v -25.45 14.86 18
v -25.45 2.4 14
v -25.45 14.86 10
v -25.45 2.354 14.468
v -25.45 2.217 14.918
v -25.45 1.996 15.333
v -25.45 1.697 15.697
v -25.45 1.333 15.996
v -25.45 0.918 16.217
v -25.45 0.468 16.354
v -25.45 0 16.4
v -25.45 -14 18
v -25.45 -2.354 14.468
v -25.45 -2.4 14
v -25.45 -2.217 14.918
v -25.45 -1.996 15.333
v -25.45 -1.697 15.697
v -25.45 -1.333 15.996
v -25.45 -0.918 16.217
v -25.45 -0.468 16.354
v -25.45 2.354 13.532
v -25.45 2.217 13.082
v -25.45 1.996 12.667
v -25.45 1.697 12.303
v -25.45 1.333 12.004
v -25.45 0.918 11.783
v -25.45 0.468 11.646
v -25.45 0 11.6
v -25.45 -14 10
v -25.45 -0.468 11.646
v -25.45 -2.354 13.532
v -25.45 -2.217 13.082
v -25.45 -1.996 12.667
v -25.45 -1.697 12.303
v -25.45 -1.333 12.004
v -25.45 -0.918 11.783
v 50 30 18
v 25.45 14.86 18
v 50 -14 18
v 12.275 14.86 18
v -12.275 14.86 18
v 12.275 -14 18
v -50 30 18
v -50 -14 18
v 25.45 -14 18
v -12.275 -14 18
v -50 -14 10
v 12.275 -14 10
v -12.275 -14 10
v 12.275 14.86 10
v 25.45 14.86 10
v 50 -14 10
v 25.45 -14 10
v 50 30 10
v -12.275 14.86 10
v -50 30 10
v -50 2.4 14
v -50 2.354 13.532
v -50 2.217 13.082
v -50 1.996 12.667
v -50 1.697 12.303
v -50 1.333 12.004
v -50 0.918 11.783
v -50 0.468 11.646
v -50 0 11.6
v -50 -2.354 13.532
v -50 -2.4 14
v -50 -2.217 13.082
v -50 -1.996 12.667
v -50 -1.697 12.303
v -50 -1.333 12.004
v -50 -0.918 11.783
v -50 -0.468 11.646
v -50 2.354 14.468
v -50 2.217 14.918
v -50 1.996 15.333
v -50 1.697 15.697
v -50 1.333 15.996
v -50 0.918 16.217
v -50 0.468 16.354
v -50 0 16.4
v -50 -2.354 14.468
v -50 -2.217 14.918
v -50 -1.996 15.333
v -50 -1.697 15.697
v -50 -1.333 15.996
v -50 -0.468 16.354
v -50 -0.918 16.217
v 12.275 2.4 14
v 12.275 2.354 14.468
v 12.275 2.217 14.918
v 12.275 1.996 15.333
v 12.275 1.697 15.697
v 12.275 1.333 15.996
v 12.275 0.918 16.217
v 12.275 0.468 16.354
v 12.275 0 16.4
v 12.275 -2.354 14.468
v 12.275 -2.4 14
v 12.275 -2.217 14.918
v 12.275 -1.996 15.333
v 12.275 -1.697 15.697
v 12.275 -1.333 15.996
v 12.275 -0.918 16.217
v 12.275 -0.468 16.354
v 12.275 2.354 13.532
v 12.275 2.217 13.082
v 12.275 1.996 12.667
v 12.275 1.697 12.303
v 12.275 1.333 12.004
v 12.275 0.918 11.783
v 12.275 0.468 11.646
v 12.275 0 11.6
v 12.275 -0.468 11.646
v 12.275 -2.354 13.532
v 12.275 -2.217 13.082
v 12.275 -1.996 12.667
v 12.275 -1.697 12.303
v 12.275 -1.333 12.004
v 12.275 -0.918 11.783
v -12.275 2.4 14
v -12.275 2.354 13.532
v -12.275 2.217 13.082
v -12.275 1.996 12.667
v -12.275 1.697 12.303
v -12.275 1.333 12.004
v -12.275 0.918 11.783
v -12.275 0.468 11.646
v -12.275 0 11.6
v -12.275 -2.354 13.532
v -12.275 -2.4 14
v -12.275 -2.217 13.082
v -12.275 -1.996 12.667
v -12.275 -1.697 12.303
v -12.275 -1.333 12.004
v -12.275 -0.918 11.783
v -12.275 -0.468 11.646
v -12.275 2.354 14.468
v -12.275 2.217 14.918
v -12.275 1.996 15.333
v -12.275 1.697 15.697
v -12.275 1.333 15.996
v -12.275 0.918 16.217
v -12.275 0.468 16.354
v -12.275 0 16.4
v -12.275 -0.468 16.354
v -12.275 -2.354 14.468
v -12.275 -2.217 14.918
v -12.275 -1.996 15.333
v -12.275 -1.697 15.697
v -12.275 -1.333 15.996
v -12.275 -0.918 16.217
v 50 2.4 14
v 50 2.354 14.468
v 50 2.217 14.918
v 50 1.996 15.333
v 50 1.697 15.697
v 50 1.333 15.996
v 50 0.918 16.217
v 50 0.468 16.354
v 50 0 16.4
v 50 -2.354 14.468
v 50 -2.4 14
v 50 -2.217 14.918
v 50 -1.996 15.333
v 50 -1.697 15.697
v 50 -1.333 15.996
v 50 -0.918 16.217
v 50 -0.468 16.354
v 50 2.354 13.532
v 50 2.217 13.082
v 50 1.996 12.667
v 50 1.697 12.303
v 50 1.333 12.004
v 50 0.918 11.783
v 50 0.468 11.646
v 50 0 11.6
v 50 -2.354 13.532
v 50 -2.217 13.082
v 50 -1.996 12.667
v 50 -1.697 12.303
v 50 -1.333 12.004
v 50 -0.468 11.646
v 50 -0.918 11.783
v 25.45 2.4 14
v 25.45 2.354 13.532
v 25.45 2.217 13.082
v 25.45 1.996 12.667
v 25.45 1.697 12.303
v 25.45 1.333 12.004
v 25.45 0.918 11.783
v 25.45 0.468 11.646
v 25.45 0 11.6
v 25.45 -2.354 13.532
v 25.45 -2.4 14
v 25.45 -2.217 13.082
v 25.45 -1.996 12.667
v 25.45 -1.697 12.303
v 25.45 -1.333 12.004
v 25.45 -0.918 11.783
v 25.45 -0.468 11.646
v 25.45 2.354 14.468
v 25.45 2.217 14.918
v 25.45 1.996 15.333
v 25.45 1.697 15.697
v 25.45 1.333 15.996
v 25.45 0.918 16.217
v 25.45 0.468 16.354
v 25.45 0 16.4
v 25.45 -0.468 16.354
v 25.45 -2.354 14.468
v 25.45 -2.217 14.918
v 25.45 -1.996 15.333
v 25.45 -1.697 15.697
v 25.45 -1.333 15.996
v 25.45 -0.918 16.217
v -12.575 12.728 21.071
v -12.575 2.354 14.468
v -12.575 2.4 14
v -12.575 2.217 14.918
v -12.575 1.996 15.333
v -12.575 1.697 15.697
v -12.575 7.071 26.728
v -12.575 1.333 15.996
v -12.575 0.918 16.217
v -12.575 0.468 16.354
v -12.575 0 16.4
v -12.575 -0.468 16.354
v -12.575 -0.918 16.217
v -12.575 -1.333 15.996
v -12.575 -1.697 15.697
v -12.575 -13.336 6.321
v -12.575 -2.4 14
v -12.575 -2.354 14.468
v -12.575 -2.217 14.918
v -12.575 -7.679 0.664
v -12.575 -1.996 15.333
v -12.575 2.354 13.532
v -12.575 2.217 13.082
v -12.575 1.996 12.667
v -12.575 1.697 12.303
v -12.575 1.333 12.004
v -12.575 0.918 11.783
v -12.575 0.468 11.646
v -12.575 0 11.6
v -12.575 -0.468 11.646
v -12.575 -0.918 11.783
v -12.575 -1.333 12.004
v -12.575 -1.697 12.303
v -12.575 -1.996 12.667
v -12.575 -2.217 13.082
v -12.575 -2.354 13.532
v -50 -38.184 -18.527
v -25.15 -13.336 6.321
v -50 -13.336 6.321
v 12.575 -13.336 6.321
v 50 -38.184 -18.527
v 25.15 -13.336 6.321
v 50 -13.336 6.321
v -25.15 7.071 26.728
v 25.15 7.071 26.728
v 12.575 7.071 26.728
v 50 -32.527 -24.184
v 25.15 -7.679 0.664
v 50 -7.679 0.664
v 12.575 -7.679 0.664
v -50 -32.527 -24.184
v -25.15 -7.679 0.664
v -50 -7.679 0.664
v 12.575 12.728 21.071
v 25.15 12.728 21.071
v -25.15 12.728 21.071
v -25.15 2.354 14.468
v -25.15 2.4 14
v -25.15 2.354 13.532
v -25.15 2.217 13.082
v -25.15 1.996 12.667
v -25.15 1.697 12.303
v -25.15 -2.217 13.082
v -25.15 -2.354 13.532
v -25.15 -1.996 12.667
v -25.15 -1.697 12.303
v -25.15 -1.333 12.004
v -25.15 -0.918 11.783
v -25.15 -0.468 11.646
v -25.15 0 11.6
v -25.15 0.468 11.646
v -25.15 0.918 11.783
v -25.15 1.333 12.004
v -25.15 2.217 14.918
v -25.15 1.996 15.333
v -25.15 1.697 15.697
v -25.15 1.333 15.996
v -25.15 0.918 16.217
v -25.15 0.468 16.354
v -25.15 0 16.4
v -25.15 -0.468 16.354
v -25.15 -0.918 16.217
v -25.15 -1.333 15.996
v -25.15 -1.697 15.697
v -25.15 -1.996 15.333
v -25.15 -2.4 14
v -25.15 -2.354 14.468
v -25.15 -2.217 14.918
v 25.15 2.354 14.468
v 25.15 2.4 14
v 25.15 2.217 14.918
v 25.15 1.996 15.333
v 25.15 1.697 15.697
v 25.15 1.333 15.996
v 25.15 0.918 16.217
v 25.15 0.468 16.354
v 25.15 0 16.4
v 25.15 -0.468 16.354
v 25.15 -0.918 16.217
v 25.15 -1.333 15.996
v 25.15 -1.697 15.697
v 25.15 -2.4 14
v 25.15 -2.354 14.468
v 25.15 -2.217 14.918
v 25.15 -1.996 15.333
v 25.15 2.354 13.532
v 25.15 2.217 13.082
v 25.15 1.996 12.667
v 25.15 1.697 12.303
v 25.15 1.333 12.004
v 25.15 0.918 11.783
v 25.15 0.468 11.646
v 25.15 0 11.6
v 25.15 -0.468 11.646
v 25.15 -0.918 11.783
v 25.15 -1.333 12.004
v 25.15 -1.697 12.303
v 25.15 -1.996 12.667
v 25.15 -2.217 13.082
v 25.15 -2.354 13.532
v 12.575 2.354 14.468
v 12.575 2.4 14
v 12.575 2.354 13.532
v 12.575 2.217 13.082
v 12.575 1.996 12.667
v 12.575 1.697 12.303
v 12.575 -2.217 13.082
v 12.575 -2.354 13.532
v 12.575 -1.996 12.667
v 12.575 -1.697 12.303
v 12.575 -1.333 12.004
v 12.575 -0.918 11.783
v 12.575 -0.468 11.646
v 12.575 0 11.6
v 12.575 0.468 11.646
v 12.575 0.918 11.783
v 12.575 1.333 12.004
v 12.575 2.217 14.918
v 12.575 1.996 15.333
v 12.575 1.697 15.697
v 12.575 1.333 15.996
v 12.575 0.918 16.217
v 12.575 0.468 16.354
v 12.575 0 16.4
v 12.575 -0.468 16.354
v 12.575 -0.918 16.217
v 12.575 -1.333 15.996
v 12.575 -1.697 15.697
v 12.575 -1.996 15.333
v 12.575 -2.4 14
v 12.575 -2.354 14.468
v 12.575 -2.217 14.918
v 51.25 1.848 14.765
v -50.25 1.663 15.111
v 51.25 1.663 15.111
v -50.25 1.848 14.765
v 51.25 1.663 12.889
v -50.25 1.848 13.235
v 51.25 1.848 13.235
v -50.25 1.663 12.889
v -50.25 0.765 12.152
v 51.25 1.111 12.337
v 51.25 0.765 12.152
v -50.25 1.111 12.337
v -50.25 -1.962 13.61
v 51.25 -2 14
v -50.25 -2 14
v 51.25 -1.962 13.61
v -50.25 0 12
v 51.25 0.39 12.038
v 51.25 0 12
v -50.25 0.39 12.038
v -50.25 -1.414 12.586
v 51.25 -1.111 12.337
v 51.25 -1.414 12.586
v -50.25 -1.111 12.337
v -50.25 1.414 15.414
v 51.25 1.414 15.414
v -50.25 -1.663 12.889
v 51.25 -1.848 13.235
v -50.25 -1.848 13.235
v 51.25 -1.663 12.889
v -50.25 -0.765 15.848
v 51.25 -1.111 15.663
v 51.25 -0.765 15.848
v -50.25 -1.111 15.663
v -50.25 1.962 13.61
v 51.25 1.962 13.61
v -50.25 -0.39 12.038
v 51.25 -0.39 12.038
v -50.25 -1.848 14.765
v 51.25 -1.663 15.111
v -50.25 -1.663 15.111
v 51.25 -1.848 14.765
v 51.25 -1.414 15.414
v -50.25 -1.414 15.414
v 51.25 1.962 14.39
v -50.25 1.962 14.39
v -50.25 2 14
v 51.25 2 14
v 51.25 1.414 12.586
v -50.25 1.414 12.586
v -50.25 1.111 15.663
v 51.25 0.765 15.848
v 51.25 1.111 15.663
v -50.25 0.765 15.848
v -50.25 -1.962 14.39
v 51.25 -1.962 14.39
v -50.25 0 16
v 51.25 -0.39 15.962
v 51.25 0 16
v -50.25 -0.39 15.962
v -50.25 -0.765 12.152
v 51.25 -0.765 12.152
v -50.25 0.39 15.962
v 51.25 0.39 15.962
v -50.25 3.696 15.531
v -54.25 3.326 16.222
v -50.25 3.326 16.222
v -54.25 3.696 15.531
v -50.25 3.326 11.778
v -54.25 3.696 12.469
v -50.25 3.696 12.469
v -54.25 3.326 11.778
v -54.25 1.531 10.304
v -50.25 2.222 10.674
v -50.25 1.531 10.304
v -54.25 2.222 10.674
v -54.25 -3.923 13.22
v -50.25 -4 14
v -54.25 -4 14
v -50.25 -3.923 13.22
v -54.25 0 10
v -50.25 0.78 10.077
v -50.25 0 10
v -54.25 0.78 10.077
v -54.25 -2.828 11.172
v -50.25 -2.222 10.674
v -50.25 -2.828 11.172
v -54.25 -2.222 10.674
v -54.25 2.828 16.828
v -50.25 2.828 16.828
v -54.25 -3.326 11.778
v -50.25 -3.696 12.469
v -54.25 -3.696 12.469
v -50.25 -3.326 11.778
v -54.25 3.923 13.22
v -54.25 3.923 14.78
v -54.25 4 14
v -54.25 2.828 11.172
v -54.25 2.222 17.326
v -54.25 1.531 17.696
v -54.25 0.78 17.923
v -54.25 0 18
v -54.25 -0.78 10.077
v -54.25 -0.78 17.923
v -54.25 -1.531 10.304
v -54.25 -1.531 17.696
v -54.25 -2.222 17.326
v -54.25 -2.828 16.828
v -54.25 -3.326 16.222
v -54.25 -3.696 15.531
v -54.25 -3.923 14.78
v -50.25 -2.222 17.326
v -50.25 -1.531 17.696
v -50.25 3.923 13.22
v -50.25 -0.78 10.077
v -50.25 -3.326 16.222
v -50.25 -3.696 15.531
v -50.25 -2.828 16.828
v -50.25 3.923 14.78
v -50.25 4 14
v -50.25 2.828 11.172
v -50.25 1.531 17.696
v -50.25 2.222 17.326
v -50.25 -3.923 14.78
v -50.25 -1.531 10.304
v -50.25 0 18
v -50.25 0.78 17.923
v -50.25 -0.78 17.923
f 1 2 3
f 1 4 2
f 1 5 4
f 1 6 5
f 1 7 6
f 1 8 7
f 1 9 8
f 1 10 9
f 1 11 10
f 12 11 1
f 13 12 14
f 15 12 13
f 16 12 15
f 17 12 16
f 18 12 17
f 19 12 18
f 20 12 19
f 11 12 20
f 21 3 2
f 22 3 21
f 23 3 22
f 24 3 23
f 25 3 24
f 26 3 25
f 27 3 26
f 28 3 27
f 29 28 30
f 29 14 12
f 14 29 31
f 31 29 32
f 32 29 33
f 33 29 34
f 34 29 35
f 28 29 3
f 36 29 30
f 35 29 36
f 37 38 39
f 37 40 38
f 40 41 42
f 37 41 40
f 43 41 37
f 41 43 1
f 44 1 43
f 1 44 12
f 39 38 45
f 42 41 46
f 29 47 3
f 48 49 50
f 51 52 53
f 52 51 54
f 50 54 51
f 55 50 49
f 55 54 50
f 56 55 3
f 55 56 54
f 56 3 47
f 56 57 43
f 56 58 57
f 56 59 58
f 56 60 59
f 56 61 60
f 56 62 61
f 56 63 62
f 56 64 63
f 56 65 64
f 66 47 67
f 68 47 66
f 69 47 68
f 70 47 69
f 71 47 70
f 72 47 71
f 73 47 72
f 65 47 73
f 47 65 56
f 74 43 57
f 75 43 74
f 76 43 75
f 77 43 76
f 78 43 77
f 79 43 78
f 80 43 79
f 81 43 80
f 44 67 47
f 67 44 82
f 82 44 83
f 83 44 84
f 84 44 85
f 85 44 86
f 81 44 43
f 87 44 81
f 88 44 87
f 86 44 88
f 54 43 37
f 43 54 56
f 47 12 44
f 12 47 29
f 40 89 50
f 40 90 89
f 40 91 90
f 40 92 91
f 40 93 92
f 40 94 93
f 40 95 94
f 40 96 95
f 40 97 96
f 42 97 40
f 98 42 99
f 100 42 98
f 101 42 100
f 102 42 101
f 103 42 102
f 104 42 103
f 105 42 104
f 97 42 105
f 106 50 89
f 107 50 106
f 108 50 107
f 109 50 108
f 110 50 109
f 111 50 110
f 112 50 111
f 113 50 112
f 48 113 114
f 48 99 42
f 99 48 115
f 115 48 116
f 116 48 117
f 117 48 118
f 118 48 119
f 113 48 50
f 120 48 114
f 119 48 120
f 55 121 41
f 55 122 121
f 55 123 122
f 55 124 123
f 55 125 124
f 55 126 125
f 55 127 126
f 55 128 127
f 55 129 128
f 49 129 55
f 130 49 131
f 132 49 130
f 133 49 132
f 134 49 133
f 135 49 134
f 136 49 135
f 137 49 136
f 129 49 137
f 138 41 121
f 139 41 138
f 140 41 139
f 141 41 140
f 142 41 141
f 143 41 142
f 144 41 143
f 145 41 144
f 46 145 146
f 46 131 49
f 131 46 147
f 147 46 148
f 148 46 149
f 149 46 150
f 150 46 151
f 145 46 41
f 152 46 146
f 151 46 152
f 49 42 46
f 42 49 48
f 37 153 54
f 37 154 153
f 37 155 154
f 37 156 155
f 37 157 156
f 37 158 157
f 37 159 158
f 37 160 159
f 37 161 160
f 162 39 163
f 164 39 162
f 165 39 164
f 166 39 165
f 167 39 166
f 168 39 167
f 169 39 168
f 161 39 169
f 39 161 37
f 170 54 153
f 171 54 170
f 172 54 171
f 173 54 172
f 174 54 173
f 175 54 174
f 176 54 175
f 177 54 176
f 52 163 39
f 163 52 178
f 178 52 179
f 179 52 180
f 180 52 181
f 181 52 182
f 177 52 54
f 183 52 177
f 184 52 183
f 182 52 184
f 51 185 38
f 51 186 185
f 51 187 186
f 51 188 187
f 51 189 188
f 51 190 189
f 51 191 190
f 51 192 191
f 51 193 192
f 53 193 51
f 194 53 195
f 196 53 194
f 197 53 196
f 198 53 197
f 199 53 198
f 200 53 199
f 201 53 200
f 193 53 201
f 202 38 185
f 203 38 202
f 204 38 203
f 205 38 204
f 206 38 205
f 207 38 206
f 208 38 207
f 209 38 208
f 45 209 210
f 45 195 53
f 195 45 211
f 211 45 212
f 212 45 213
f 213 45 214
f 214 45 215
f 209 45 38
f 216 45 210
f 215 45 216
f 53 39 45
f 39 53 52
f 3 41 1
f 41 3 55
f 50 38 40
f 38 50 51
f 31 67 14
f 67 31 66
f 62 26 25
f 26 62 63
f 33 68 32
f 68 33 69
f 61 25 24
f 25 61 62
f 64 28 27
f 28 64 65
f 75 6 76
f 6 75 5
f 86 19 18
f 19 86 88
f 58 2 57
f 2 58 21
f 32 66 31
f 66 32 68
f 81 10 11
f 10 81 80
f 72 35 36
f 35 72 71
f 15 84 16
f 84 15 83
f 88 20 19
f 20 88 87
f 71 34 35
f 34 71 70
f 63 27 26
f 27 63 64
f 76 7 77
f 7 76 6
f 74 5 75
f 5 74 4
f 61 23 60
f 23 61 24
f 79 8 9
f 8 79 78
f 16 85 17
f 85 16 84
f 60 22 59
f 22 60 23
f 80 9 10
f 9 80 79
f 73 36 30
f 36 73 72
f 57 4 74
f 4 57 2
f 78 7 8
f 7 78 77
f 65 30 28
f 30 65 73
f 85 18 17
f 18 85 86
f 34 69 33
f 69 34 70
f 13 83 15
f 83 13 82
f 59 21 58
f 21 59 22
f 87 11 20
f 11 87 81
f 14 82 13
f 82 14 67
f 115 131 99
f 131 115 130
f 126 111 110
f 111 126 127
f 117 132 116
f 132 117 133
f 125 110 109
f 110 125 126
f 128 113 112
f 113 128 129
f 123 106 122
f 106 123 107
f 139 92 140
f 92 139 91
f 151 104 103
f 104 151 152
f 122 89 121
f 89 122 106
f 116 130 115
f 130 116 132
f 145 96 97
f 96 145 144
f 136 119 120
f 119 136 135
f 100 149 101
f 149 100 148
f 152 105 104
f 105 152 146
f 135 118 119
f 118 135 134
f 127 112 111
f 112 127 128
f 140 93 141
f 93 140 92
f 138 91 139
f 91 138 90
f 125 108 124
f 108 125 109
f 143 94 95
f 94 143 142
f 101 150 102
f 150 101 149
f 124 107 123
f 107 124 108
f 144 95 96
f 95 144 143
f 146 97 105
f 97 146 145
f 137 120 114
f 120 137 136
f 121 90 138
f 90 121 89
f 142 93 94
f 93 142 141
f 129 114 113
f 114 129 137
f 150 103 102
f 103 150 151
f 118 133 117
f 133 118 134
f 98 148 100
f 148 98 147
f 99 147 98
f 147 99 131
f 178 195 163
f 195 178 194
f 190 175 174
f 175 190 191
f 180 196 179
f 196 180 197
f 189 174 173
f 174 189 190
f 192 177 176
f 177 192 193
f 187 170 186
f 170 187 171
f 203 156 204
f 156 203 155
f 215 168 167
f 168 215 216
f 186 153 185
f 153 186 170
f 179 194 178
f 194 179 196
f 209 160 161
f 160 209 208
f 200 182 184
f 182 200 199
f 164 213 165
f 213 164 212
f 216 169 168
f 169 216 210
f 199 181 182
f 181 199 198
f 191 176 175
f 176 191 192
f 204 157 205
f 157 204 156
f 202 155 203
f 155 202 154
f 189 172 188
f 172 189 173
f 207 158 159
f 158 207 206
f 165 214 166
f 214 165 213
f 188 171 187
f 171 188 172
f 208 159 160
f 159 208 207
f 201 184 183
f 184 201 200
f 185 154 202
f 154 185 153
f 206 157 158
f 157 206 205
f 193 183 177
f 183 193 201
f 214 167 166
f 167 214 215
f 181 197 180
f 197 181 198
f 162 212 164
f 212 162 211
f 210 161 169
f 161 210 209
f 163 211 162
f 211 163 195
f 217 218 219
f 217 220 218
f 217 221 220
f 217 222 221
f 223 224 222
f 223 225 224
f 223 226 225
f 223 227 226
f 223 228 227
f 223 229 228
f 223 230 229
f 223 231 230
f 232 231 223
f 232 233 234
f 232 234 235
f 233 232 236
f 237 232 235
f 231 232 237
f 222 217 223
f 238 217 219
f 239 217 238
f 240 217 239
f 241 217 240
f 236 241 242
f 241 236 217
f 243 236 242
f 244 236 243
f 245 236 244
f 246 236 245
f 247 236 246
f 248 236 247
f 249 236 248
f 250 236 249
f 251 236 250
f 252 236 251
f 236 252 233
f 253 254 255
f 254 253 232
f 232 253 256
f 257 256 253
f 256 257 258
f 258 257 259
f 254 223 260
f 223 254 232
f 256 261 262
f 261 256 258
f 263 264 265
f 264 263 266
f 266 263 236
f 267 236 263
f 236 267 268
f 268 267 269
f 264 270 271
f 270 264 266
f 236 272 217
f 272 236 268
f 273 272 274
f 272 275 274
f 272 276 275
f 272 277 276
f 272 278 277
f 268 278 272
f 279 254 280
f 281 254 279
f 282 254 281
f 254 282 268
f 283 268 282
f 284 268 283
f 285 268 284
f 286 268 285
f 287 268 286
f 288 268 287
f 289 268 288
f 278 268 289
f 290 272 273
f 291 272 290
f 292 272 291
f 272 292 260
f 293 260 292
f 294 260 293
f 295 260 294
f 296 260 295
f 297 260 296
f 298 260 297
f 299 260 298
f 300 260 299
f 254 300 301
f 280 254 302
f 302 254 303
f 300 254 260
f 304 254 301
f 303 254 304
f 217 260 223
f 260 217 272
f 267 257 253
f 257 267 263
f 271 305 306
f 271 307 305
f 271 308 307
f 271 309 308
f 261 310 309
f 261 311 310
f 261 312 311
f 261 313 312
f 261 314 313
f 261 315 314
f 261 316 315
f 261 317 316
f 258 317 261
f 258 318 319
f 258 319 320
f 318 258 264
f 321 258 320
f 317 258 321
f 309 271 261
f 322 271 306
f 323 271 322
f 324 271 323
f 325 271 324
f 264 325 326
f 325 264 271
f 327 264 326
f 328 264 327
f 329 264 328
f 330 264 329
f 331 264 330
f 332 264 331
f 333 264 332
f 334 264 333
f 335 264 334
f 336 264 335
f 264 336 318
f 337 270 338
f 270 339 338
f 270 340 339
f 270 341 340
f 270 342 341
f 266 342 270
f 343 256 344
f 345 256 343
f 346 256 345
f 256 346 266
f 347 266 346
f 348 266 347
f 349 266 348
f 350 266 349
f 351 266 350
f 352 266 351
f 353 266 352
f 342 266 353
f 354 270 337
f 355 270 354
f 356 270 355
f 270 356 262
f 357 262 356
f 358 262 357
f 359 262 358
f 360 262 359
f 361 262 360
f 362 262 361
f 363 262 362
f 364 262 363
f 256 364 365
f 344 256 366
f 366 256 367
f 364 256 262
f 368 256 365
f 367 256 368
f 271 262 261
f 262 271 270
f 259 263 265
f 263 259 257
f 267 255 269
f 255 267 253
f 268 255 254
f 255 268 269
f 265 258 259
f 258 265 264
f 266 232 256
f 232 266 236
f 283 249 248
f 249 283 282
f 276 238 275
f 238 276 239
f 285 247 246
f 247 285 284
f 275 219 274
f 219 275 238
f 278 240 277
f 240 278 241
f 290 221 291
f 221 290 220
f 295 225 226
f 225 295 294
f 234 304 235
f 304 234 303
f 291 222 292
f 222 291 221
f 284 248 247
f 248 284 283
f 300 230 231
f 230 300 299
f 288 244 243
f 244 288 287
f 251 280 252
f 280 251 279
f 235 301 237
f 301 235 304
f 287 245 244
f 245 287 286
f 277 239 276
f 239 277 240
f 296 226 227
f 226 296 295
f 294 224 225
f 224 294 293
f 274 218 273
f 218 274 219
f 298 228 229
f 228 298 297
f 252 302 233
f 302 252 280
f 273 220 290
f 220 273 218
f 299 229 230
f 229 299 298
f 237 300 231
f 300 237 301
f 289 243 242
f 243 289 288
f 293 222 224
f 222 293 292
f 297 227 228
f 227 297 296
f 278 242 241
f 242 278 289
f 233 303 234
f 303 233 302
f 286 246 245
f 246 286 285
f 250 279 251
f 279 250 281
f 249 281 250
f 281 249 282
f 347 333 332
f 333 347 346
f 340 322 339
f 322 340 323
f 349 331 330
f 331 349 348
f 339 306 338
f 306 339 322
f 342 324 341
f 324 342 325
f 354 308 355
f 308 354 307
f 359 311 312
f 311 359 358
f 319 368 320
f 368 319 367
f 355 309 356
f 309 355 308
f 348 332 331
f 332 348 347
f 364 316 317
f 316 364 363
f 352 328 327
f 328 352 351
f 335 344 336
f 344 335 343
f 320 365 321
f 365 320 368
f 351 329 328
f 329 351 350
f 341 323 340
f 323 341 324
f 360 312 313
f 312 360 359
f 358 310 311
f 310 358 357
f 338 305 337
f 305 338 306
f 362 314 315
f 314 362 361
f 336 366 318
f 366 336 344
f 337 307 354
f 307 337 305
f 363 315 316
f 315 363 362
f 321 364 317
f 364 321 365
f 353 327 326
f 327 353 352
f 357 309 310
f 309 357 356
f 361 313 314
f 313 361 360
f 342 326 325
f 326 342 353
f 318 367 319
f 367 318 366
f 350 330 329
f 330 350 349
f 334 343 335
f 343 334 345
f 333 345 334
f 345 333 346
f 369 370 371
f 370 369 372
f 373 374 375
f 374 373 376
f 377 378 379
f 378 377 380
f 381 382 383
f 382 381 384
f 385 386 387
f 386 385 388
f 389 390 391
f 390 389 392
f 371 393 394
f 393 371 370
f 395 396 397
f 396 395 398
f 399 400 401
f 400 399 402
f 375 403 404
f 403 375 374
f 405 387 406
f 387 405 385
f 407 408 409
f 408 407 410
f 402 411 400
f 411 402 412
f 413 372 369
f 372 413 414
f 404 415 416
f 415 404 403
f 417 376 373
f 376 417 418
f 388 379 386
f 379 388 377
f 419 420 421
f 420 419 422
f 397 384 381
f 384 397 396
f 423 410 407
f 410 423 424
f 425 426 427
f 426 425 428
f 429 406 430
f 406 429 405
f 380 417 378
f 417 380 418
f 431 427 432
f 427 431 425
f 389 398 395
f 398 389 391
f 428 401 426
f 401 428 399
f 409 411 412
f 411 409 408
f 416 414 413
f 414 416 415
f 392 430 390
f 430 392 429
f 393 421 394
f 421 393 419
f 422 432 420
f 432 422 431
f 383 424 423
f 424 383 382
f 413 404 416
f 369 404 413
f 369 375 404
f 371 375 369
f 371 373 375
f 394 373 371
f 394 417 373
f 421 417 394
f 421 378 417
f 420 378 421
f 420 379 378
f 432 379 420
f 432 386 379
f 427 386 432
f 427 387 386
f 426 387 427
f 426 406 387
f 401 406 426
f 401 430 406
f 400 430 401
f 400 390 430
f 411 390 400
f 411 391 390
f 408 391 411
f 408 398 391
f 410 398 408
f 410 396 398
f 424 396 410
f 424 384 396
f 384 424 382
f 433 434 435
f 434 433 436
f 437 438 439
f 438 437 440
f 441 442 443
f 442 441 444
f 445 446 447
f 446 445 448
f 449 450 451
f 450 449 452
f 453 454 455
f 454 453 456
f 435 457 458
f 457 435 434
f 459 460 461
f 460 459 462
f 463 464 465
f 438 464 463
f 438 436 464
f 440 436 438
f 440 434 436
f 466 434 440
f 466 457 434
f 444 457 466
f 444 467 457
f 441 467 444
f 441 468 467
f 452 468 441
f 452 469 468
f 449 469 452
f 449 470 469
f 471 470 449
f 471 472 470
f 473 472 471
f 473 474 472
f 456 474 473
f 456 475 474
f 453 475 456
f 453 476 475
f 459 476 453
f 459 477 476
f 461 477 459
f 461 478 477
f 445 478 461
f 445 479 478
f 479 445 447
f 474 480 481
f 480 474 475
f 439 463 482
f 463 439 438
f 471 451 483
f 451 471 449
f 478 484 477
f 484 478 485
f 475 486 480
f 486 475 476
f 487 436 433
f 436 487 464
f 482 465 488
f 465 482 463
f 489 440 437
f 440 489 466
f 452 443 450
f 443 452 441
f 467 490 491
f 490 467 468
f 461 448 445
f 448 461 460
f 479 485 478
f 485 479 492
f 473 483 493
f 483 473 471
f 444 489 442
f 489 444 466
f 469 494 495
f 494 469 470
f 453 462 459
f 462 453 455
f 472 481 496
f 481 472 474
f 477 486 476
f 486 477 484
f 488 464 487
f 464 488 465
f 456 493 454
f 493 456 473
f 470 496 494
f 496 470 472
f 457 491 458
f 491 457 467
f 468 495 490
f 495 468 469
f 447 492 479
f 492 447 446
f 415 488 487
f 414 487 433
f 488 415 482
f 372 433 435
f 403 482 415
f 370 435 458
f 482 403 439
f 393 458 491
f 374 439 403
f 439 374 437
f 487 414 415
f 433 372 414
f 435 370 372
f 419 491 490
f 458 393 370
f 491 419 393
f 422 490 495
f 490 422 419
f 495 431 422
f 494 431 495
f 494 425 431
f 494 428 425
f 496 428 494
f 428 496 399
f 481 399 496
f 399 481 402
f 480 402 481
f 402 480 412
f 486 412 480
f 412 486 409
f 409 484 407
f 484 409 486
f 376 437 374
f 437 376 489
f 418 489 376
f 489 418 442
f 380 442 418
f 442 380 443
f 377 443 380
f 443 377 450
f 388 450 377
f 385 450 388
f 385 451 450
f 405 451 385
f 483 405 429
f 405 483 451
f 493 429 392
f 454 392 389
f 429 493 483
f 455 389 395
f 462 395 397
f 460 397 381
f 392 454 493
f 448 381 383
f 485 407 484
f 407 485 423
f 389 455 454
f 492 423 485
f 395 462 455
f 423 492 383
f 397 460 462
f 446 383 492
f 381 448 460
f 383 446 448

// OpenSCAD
$fn = 32;

// ------------------------------------------------------------------------
// Butt hinge: hinge 100 mm, leaf swung 45 deg
// Every part is its own module, assembly() places every instance.
// ------------------------------------------------------------------------

// --- part 1 ---
module hinge_base() {
  difference() {
    union() {
      translate([-50, -14, -4]) cube([24.55, 44, 8]);
      translate([-12.275, -14, -4]) cube([24.55, 44, 8]);
      translate([25.45, -14, -4]) cube([24.55, 44, 8]);
      translate([-50, 14.86, -4]) cube([100, 15.14, 8]);
    }
    translate([-37.725, 0, 0]) rotate([0, 90, 0]) cylinder(h = 26.55, d = 4.8, center = true);
    translate([0, 0, 0]) rotate([0, 90, 0]) cylinder(h = 26.55, d = 4.8, center = true);
    translate([37.725, 0, 0]) rotate([0, 90, 0]) cylinder(h = 26.55, d = 4.8, center = true);
  }
}

// --- part 2 ---
module hinge_mover() {
  difference() {
    union() {
      translate([-25.15, -50, -4]) cube([12.575, 64, 8]);
      translate([12.575, -50, -4]) cube([12.575, 64, 8]);
      translate([-50, -50, -4]) cube([100, 35.14, 8]);
    }
    translate([-18.863, 0, 0]) rotate([0, 90, 0]) cylinder(h = 14.575, d = 4.8, center = true);
    translate([18.863, 0, 0]) rotate([0, 90, 0]) cylinder(h = 14.575, d = 4.8, center = true);
  }
}

// --- part 3 ---
module hinge_pin() {
  rotate([0, 90, 0]) cylinder(h = 102.5, d = 4, center = true);
  translate([-54.25, 0, 0]) rotate([0, 90, 0]) cylinder(h = 4, d = 8);
}

// --- assembly ---
module assembly() {
  color([0.80, 0.24, 0.20]) translate([0, 0, 14]) rotate([0, 0, 0]) hinge_base();
  color([0.20, 0.45, 0.75]) translate([0, 0, 14]) rotate([45, 0, 0]) hinge_mover();
  color([0.25, 0.62, 0.32]) translate([0, 0, 14]) rotate([0, 0, 0]) hinge_pin();
}

assembly();
